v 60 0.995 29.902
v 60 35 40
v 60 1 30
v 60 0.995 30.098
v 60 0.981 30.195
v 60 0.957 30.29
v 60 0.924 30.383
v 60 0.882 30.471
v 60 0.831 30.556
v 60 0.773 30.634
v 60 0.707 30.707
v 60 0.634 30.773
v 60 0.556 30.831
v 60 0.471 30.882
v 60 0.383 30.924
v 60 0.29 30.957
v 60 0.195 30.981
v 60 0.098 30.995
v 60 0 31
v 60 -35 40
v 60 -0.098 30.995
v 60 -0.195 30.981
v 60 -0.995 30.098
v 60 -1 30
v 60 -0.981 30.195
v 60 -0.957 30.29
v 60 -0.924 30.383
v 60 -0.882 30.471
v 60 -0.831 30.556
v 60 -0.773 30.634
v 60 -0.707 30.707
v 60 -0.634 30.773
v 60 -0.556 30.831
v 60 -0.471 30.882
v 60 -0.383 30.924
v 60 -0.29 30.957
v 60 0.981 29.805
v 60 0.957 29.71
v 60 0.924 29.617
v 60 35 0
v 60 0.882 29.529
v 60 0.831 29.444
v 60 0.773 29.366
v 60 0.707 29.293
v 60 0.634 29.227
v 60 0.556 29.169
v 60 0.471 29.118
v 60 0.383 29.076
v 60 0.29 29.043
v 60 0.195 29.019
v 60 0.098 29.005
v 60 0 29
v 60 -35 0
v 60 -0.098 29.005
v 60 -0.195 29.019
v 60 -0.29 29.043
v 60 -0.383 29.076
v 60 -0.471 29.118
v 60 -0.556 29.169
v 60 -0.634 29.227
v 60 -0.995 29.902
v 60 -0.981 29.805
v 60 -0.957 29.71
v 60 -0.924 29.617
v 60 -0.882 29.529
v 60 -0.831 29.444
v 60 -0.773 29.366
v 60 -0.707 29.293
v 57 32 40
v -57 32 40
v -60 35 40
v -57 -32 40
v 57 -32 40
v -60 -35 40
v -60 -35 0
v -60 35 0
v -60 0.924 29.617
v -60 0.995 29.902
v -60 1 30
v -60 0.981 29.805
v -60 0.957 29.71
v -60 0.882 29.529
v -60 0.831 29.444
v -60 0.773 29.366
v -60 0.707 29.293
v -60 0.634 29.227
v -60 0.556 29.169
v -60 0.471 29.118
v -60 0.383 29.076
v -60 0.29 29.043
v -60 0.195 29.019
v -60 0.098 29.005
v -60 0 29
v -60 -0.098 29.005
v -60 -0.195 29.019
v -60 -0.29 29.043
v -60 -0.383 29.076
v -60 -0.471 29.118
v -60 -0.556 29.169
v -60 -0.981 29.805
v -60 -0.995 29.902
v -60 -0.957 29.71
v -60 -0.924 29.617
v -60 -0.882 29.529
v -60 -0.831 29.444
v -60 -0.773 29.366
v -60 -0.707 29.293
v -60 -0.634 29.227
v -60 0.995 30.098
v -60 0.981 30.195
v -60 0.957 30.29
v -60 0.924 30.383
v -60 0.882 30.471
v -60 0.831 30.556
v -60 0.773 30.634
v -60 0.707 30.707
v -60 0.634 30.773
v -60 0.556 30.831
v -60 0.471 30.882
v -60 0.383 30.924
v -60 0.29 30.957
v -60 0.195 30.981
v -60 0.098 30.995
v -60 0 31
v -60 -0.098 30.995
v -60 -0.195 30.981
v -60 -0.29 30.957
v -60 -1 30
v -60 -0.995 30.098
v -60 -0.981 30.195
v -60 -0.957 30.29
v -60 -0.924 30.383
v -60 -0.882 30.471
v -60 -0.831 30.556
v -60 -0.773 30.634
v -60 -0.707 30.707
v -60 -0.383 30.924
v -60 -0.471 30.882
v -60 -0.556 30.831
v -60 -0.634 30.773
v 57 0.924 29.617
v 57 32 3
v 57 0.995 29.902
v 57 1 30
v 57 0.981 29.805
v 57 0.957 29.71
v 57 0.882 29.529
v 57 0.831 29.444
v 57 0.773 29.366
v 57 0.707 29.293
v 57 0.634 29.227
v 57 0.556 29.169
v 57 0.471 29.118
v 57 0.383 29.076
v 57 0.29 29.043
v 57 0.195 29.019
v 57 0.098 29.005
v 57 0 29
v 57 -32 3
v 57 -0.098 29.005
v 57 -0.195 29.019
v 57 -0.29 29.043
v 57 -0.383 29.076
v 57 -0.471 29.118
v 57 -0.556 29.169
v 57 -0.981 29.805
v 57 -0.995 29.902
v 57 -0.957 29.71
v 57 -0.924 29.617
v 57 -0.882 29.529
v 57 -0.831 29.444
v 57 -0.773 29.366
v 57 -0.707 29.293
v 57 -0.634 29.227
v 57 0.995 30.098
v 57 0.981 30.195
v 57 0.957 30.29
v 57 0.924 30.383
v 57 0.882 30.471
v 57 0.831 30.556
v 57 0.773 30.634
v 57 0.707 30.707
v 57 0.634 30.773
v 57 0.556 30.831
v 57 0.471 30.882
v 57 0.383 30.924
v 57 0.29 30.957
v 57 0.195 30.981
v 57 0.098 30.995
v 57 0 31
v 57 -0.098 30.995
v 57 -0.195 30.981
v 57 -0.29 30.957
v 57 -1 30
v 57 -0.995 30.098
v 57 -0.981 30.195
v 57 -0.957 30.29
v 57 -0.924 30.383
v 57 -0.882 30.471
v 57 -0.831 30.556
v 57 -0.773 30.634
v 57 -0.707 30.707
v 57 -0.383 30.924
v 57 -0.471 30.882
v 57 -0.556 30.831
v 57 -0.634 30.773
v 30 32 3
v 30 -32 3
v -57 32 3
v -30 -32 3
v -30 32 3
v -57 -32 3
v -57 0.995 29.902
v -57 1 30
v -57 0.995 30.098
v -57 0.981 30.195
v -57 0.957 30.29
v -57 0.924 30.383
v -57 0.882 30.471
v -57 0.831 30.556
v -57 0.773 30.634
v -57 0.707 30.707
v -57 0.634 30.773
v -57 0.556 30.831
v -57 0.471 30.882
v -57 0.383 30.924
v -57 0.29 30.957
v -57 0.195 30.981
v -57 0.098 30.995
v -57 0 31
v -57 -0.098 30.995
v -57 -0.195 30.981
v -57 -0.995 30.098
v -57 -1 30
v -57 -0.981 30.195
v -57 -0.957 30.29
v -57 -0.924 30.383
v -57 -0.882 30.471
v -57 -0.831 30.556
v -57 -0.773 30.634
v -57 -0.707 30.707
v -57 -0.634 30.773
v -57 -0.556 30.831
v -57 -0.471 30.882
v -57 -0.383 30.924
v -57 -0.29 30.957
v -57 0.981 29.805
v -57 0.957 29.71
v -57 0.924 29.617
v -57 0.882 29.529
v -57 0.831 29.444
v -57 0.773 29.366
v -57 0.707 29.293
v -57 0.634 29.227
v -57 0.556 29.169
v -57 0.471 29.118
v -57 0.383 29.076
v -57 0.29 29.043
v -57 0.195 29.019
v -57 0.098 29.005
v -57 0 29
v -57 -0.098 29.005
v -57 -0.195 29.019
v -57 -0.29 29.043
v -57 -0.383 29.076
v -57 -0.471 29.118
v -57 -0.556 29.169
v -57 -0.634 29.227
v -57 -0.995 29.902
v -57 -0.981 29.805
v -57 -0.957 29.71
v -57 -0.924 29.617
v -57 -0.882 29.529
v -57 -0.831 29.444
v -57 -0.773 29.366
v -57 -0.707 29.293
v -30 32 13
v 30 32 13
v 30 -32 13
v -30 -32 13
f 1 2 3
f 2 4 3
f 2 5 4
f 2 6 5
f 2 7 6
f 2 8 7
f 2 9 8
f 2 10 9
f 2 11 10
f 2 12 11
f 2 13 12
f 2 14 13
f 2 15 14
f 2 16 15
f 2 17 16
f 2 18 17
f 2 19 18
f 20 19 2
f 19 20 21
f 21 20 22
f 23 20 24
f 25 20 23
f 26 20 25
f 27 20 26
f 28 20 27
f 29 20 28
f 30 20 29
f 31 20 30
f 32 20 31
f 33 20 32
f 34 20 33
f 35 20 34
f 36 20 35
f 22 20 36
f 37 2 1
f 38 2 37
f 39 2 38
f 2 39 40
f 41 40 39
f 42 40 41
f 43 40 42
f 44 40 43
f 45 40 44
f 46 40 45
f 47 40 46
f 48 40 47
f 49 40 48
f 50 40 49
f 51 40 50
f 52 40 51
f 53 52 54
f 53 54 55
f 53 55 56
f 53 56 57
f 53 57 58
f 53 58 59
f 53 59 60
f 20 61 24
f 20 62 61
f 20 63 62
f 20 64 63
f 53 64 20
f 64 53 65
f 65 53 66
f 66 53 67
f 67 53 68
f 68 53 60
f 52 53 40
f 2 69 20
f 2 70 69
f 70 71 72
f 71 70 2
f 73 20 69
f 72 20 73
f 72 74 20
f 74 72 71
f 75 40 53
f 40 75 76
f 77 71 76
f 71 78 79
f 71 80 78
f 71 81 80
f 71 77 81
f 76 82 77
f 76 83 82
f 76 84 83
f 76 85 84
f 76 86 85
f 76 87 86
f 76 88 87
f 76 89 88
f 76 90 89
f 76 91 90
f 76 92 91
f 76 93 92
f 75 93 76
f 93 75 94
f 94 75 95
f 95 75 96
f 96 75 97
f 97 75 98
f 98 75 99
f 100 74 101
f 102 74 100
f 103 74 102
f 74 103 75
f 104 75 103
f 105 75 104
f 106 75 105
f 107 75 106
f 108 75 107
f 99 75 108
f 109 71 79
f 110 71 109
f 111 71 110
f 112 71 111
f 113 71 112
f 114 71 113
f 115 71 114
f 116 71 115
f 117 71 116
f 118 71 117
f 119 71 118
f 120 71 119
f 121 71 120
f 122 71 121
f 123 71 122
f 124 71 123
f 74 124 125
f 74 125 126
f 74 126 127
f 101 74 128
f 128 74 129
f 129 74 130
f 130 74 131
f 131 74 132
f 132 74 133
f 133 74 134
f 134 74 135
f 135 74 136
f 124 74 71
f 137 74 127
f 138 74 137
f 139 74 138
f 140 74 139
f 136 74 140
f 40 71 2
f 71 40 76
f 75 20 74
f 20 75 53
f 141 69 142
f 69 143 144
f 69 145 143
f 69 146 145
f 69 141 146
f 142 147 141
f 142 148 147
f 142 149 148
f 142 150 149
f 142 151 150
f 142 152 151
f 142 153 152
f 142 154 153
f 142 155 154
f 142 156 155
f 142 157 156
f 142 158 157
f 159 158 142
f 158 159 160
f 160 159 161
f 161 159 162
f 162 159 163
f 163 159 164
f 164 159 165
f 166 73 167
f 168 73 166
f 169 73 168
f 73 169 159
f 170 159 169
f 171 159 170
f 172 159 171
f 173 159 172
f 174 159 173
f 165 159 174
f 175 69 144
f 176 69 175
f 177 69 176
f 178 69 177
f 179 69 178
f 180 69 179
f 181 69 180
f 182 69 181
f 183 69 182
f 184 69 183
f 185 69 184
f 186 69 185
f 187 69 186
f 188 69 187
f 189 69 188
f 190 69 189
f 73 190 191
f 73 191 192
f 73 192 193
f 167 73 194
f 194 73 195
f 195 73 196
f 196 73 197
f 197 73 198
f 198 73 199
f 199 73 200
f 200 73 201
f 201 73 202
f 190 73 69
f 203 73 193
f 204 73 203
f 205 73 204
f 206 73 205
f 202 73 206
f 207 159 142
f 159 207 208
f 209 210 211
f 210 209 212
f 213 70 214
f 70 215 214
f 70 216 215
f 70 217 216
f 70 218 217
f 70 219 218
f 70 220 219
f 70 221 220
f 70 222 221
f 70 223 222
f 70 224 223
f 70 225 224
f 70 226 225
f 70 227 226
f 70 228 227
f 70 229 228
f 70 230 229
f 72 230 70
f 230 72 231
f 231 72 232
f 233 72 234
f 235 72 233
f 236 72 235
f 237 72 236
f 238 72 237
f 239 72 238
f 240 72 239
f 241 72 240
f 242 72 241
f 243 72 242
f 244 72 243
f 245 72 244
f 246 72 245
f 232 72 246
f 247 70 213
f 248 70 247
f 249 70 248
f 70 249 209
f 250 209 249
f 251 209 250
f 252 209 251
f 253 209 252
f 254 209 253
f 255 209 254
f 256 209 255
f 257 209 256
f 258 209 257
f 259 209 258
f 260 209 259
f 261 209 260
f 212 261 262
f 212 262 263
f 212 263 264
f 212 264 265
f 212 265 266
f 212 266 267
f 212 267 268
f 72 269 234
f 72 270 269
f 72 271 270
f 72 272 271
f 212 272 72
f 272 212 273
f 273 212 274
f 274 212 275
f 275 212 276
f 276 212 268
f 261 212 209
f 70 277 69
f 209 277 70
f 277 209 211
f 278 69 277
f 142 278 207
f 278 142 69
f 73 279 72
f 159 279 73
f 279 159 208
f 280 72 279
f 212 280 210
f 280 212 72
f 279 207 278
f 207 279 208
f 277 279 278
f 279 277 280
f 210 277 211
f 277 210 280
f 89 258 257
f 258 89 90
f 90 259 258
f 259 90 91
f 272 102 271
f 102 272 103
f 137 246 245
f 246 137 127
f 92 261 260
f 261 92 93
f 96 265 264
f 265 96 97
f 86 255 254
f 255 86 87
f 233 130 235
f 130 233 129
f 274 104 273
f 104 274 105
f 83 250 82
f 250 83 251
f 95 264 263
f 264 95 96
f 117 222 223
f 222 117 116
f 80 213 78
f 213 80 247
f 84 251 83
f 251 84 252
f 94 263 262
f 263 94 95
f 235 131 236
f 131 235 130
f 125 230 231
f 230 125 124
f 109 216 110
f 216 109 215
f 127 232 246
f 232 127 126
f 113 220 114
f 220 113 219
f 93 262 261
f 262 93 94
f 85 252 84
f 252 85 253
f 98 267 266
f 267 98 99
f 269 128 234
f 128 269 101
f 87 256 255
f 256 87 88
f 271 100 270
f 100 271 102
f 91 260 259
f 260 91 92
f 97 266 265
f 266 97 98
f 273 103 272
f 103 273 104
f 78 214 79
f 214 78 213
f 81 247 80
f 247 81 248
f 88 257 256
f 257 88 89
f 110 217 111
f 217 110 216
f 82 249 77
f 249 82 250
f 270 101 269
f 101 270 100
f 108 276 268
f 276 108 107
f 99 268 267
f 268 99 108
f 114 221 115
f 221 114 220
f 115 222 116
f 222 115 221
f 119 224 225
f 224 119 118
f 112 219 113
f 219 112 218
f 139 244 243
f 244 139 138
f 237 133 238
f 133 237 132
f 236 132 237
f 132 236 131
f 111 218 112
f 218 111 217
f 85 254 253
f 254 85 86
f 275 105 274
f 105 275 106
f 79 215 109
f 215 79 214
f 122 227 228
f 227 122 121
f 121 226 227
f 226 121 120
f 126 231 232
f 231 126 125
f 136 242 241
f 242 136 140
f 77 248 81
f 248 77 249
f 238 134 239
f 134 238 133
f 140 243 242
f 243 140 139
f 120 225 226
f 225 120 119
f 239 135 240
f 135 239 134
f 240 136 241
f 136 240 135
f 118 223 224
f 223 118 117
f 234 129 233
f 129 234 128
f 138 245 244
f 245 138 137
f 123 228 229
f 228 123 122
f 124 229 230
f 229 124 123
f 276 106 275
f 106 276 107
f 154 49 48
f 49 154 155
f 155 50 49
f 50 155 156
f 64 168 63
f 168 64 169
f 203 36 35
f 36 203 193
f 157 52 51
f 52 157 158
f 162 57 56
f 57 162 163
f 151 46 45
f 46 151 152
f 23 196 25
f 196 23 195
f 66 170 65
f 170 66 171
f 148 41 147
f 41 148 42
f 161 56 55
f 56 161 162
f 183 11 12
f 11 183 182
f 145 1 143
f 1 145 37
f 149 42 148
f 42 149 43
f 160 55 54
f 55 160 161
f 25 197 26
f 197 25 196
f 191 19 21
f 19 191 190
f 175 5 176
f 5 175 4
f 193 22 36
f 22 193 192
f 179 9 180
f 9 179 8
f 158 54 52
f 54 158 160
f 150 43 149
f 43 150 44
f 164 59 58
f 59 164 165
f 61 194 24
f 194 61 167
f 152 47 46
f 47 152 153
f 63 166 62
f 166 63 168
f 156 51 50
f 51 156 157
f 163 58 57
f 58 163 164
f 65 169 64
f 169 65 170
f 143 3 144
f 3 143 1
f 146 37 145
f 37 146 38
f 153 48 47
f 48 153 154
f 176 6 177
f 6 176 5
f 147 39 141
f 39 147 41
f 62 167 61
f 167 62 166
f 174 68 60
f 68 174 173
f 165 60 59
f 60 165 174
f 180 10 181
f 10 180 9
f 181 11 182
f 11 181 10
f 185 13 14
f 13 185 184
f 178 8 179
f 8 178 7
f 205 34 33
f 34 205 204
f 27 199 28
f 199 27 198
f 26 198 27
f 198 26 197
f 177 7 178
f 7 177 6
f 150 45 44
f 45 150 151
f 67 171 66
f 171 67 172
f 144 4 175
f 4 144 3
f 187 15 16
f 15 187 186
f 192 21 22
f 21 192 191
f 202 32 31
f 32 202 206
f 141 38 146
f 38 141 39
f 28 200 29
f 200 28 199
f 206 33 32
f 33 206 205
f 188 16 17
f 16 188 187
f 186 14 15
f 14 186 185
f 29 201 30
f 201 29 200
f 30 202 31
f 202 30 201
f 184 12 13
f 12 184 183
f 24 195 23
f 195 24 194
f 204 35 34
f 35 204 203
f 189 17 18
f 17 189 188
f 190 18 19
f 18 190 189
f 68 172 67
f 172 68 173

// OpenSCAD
// Dimensions (mm)
ext_x = 120;      // External X dimension
ext_y = 70;       // External Y dimension
ext_z = 40;       // External Z dimension
wall = 3;         // Wall thickness
floor = 3;        // Floor thickness

// Platform parameters
plat_x = 60;      // Platform length in X (centered)
plat_z_top = 13;  // Platform top at Z=13 (10mm above inner floor at z=3)

// Electrode hole parameters
hole_d = 2;       // Hole diameter
hole_z = 30;      // Hole Z position (10mm from top)
hole_y = 0;       // Hole Y position (center)

// Resolution for circular features
$fn = 64;

// Calculated dimensions
inner_x = ext_x - 2 * wall;
inner_y = ext_y - 2 * wall;

// Build the complete part
difference() {
    union() {
        // Tank: hollow box with floor, open at top
        difference() {
            translate([-ext_x/2, -ext_y/2, 0])
                cube([ext_x, ext_y, ext_z]);
            translate([-inner_x/2, -inner_y/2, floor])
                cube([inner_x, inner_y, ext_z]);
        }
        
        // Platform: spans full inner Y width, raised 10mm above floor
        translate([-plat_x/2, -inner_y/2, floor])
            cube([plat_x, inner_y, plat_z_top - floor]);
    }
    
    // Left electrode hole through left wall
    translate([-ext_x/2 - 0.5, hole_y, hole_z])
        rotate([0, 90, 0])
        cylinder(r=hole_d/2, h=wall + 1);
    
    // Right electrode hole through right wall
    translate([ext_x/2 - wall - 0.5, hole_y, hole_z])
        rotate([0, 90, 0])
        cylinder(r=hole_d/2, h=wall + 1);
}
